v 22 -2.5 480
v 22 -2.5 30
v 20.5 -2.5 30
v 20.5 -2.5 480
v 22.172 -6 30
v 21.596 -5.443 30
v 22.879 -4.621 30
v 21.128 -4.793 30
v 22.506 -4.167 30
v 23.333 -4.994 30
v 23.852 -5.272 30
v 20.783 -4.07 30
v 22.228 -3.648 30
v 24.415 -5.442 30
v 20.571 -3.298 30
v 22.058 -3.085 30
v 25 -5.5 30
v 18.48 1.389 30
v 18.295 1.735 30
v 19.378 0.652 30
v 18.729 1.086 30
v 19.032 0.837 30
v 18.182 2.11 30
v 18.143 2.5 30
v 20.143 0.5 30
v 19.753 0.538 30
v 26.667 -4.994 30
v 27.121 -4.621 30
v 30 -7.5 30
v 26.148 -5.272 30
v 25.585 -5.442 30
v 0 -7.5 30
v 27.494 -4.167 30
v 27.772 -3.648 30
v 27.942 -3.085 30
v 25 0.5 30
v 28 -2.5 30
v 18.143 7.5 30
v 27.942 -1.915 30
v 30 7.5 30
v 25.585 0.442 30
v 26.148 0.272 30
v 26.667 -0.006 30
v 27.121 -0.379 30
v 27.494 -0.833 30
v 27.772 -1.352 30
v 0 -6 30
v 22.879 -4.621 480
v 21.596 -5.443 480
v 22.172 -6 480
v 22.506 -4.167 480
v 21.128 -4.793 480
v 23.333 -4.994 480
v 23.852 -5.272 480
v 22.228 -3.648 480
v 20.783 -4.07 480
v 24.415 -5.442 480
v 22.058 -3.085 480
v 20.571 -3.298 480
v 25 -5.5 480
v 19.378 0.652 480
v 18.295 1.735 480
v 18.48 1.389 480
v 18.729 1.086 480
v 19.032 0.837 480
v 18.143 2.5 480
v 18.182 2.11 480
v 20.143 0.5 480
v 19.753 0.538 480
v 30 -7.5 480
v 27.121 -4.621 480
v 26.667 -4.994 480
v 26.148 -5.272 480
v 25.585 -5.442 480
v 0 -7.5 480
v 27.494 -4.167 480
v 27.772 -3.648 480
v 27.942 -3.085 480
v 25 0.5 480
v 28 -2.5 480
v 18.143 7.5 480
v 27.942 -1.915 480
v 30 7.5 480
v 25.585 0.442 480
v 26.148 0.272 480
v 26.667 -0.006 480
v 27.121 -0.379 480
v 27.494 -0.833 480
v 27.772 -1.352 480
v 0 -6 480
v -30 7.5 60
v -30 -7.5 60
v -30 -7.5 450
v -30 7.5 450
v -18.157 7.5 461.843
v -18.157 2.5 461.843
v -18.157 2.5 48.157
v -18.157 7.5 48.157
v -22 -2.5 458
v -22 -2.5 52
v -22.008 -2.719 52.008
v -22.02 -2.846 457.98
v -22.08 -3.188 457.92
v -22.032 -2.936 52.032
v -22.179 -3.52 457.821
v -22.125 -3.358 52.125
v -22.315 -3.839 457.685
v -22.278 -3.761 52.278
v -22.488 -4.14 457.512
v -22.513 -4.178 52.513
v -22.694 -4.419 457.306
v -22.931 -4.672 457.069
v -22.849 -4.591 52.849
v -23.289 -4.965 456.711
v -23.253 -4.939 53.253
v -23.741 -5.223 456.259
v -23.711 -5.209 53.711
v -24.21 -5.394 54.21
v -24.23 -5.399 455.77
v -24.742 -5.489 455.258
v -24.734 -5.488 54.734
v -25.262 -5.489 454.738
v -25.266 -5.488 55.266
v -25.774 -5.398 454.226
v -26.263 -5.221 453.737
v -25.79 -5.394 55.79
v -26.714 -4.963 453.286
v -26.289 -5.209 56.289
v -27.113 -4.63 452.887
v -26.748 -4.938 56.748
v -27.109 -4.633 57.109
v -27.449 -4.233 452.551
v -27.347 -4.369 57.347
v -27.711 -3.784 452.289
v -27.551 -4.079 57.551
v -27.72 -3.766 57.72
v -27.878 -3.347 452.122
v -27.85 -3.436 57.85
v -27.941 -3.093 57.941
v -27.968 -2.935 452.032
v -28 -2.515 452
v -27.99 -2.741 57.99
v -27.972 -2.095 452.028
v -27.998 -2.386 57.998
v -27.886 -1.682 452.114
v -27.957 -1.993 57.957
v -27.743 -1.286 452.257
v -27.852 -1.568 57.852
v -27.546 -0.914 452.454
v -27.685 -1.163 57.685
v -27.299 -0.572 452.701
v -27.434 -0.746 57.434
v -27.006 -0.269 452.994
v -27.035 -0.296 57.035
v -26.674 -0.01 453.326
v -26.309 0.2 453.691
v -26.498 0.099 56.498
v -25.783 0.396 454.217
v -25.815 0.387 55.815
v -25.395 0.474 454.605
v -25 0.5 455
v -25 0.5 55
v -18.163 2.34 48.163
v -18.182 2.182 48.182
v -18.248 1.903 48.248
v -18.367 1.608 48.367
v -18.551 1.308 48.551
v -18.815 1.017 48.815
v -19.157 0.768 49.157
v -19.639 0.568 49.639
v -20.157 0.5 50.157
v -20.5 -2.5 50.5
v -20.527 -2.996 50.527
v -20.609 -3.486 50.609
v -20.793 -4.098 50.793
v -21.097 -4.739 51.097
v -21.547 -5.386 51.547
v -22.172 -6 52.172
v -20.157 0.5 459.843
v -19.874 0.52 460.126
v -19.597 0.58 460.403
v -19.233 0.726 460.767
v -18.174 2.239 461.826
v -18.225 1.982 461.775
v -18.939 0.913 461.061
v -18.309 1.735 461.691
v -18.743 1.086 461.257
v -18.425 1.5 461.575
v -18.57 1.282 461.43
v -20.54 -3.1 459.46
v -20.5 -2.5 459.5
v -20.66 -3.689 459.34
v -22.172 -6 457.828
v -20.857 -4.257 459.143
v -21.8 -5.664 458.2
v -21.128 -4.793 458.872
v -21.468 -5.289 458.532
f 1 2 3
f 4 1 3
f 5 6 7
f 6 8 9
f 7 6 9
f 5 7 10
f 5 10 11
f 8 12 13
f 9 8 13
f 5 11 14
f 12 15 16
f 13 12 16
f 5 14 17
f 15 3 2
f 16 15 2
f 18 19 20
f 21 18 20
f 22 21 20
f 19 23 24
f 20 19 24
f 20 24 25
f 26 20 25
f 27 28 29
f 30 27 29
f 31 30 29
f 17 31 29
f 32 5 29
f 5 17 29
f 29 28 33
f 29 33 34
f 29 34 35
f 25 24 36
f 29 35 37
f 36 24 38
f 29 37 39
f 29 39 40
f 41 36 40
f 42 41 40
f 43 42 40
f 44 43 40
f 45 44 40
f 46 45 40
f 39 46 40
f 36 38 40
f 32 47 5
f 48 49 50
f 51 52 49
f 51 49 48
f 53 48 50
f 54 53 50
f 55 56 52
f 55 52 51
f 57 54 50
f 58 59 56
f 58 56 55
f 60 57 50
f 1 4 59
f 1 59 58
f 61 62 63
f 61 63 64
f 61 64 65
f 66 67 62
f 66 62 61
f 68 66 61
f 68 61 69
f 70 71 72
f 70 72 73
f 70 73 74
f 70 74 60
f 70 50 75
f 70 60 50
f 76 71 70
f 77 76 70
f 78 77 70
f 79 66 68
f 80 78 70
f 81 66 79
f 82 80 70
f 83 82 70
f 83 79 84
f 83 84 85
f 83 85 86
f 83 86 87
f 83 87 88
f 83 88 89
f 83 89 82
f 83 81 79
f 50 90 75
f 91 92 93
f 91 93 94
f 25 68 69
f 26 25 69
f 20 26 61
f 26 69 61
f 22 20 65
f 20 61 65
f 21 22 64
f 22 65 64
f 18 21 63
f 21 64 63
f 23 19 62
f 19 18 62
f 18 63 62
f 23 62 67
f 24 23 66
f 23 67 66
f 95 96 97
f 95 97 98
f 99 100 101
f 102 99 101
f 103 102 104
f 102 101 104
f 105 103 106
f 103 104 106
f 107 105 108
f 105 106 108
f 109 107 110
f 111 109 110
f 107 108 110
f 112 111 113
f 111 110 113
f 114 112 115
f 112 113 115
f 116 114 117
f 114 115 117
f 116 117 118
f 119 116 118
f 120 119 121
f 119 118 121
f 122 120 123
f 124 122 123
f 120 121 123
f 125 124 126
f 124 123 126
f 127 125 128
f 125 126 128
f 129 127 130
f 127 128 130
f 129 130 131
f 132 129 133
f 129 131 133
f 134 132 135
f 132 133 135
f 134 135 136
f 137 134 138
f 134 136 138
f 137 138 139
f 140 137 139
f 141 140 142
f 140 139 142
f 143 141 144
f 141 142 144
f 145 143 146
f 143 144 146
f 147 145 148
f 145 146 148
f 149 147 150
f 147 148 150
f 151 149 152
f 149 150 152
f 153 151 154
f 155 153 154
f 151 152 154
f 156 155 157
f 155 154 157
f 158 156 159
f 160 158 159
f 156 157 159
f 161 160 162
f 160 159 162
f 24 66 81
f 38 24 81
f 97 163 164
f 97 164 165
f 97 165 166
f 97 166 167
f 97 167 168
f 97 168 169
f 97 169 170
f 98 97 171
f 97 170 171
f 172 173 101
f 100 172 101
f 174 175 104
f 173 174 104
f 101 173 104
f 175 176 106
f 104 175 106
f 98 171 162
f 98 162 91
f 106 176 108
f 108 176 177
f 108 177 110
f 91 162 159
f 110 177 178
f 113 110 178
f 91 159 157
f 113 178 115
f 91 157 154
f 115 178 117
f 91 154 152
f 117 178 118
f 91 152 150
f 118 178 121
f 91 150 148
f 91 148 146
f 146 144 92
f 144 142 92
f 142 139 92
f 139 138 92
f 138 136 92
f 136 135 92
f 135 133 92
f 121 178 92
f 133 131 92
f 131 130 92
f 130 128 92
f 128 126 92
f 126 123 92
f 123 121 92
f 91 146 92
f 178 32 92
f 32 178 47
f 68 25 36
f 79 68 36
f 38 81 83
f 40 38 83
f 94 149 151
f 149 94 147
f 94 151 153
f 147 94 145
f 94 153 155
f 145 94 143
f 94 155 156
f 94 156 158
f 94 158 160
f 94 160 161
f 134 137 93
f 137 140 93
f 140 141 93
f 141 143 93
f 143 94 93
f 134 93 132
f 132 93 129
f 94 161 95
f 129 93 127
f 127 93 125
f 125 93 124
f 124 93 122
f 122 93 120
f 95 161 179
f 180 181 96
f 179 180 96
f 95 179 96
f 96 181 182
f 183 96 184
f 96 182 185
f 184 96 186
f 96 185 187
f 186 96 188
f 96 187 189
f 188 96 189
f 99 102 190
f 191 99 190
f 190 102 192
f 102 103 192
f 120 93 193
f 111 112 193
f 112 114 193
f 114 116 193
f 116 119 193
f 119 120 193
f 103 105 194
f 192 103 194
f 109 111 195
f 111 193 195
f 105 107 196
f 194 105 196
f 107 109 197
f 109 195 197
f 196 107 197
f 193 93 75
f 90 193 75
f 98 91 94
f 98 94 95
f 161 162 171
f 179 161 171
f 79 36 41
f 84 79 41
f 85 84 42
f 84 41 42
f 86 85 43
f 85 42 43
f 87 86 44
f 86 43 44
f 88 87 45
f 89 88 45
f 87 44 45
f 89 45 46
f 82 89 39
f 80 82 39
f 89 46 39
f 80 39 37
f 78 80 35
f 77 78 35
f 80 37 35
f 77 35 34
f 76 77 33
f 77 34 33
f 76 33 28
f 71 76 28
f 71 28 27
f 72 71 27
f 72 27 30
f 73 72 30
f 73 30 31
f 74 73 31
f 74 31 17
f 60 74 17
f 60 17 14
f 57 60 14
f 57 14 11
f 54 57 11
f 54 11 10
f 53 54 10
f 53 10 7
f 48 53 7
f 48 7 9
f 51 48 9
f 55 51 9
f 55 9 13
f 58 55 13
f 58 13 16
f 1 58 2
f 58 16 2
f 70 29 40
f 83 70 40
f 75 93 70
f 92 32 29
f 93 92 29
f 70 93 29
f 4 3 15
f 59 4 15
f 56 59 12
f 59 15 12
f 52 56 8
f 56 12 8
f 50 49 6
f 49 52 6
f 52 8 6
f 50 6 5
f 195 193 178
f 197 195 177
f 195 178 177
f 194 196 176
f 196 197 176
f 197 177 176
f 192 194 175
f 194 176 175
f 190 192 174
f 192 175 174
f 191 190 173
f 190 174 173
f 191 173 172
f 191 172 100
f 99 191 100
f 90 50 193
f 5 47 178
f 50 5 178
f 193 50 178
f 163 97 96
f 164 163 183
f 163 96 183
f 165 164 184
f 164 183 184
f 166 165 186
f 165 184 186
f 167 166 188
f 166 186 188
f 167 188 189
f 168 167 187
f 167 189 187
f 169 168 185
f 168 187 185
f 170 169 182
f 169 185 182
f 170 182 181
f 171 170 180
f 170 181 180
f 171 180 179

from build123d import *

# Parameters (mm, degrees)
SKETCH_1_W               = 60
SKETCH_1_H               = 15
EXTRUDE_1_DEPTH          = 510
SKETCH_2_R               = 3
CUT_EXTRUDE_1_DEPTH      = 511.936639908
CUT_EXTRUDE_2_DEPTH      = 511.936639908
SKETCH_4_W               = 36.3
SKETCH_4_H               = 7
CUT_EXTRUDE_3_DEPTH      = 511.936639908
FILLET_1_R               = 2
CUT_EXTRUDE_4_DEPTH      = 512.101751122
CUT_EXTRUDE_6_DEPTH      = 512.101751122
CUT_EXTRUDE_6_DEPTH_BACK = 512.101751122
SKETCH_7_W               = 30
SKETCH_7_H               = 30


with BuildPart() as part:
    # 스케치1 → 보스-돌출1 (new body)
    with BuildSketch(Plane.XY):
        Rectangle(SKETCH_1_W, SKETCH_1_H)
    extrude(amount=EXTRUDE_1_DEPTH)

    # 스케치2 → 컷-돌출1 (cut, through all)
    with BuildSketch(Plane(origin=(0, 0, 0), x_dir=(-1, 0, 0), z_dir=(0, 0, -1))):
        with Locations((-25, -2.5)):
            Circle(SKETCH_2_R)
        with Locations((25, -2.5)):
            Circle(SKETCH_2_R)
    extrude(amount=-CUT_EXTRUDE_1_DEPTH, mode=Mode.SUBTRACT)

    # 스케치3 → 컷-돌출2 (cut, through all)
    with BuildSketch(Plane(origin=(0, 0, 0), x_dir=(-1, 0, 0), z_dir=(0, 0, -1))):
        with BuildLine():
            Line((-22.171572875, -6), (22.171572875, -6))
            ThreePointArc((22.171572875, -6), (20.939339828, -4.439339828), (20.5, -2.5))
            Line((20.5, -2.5), (25, -2.5))
            Line((25, -2.5), (25, 0.5))
            Line((25, 0.5), (-25, 0.5))
            Line((-25, 0.5), (-25, -2.5))
            Line((-25, -2.5), (-20.5, -2.5))
            ThreePointArc((-20.5, -2.5), (-20.939339828, -4.439339828), (-22.171572875, -6))
        make_face()
    extrude(amount=-CUT_EXTRUDE_2_DEPTH, mode=Mode.SUBTRACT)

    # 스케치4 → 컷-돌출3 (cut, through all)
    with BuildSketch(Plane(origin=(0, 0, 0), x_dir=(-1, 0, 0), z_dir=(0, 0, -1))):
        with Locations((0.006888359, 4)):
            Rectangle(SKETCH_4_W, SKETCH_4_H)
    extrude(amount=-CUT_EXTRUDE_3_DEPTH, mode=Mode.SUBTRACT)

    # 필렛1
    fillet_1_edges = [part.edges().sort_by_distance(p)[0] for p in [
        (-18.156888359, 0.5, 255),
        (18.143111641, 0.5, 255),
    ]]
    fillet(fillet_1_edges, radius=FILLET_1_R)

    # 스케치5 → 컷-돌출4 (cut, through all)
    with BuildSketch(Plane.XZ.offset(7.5)):
        Polygon((-30, 510), (-30, 450), (30, 510), align=None)
        Polygon((-30, 0), (30, 0), (-30, 60), align=None)
    extrude(amount=-CUT_EXTRUDE_4_DEPTH, mode=Mode.SUBTRACT)

    # 스케치7 → 컷-돌출6 (cut, two sides: drawn at the far end of the back side and taken through both)
    with BuildSketch(Plane.XZ.offset(7.5).offset(-CUT_EXTRUDE_6_DEPTH_BACK)):
        with Locations((15, 15)):
            Rectangle(SKETCH_7_W, SKETCH_7_H)
        with Locations((15, 495)):
            Rectangle(SKETCH_7_W, SKETCH_7_H)
    extrude(amount=CUT_EXTRUDE_6_DEPTH + CUT_EXTRUDE_6_DEPTH_BACK, mode=Mode.SUBTRACT)


solid = part.part
